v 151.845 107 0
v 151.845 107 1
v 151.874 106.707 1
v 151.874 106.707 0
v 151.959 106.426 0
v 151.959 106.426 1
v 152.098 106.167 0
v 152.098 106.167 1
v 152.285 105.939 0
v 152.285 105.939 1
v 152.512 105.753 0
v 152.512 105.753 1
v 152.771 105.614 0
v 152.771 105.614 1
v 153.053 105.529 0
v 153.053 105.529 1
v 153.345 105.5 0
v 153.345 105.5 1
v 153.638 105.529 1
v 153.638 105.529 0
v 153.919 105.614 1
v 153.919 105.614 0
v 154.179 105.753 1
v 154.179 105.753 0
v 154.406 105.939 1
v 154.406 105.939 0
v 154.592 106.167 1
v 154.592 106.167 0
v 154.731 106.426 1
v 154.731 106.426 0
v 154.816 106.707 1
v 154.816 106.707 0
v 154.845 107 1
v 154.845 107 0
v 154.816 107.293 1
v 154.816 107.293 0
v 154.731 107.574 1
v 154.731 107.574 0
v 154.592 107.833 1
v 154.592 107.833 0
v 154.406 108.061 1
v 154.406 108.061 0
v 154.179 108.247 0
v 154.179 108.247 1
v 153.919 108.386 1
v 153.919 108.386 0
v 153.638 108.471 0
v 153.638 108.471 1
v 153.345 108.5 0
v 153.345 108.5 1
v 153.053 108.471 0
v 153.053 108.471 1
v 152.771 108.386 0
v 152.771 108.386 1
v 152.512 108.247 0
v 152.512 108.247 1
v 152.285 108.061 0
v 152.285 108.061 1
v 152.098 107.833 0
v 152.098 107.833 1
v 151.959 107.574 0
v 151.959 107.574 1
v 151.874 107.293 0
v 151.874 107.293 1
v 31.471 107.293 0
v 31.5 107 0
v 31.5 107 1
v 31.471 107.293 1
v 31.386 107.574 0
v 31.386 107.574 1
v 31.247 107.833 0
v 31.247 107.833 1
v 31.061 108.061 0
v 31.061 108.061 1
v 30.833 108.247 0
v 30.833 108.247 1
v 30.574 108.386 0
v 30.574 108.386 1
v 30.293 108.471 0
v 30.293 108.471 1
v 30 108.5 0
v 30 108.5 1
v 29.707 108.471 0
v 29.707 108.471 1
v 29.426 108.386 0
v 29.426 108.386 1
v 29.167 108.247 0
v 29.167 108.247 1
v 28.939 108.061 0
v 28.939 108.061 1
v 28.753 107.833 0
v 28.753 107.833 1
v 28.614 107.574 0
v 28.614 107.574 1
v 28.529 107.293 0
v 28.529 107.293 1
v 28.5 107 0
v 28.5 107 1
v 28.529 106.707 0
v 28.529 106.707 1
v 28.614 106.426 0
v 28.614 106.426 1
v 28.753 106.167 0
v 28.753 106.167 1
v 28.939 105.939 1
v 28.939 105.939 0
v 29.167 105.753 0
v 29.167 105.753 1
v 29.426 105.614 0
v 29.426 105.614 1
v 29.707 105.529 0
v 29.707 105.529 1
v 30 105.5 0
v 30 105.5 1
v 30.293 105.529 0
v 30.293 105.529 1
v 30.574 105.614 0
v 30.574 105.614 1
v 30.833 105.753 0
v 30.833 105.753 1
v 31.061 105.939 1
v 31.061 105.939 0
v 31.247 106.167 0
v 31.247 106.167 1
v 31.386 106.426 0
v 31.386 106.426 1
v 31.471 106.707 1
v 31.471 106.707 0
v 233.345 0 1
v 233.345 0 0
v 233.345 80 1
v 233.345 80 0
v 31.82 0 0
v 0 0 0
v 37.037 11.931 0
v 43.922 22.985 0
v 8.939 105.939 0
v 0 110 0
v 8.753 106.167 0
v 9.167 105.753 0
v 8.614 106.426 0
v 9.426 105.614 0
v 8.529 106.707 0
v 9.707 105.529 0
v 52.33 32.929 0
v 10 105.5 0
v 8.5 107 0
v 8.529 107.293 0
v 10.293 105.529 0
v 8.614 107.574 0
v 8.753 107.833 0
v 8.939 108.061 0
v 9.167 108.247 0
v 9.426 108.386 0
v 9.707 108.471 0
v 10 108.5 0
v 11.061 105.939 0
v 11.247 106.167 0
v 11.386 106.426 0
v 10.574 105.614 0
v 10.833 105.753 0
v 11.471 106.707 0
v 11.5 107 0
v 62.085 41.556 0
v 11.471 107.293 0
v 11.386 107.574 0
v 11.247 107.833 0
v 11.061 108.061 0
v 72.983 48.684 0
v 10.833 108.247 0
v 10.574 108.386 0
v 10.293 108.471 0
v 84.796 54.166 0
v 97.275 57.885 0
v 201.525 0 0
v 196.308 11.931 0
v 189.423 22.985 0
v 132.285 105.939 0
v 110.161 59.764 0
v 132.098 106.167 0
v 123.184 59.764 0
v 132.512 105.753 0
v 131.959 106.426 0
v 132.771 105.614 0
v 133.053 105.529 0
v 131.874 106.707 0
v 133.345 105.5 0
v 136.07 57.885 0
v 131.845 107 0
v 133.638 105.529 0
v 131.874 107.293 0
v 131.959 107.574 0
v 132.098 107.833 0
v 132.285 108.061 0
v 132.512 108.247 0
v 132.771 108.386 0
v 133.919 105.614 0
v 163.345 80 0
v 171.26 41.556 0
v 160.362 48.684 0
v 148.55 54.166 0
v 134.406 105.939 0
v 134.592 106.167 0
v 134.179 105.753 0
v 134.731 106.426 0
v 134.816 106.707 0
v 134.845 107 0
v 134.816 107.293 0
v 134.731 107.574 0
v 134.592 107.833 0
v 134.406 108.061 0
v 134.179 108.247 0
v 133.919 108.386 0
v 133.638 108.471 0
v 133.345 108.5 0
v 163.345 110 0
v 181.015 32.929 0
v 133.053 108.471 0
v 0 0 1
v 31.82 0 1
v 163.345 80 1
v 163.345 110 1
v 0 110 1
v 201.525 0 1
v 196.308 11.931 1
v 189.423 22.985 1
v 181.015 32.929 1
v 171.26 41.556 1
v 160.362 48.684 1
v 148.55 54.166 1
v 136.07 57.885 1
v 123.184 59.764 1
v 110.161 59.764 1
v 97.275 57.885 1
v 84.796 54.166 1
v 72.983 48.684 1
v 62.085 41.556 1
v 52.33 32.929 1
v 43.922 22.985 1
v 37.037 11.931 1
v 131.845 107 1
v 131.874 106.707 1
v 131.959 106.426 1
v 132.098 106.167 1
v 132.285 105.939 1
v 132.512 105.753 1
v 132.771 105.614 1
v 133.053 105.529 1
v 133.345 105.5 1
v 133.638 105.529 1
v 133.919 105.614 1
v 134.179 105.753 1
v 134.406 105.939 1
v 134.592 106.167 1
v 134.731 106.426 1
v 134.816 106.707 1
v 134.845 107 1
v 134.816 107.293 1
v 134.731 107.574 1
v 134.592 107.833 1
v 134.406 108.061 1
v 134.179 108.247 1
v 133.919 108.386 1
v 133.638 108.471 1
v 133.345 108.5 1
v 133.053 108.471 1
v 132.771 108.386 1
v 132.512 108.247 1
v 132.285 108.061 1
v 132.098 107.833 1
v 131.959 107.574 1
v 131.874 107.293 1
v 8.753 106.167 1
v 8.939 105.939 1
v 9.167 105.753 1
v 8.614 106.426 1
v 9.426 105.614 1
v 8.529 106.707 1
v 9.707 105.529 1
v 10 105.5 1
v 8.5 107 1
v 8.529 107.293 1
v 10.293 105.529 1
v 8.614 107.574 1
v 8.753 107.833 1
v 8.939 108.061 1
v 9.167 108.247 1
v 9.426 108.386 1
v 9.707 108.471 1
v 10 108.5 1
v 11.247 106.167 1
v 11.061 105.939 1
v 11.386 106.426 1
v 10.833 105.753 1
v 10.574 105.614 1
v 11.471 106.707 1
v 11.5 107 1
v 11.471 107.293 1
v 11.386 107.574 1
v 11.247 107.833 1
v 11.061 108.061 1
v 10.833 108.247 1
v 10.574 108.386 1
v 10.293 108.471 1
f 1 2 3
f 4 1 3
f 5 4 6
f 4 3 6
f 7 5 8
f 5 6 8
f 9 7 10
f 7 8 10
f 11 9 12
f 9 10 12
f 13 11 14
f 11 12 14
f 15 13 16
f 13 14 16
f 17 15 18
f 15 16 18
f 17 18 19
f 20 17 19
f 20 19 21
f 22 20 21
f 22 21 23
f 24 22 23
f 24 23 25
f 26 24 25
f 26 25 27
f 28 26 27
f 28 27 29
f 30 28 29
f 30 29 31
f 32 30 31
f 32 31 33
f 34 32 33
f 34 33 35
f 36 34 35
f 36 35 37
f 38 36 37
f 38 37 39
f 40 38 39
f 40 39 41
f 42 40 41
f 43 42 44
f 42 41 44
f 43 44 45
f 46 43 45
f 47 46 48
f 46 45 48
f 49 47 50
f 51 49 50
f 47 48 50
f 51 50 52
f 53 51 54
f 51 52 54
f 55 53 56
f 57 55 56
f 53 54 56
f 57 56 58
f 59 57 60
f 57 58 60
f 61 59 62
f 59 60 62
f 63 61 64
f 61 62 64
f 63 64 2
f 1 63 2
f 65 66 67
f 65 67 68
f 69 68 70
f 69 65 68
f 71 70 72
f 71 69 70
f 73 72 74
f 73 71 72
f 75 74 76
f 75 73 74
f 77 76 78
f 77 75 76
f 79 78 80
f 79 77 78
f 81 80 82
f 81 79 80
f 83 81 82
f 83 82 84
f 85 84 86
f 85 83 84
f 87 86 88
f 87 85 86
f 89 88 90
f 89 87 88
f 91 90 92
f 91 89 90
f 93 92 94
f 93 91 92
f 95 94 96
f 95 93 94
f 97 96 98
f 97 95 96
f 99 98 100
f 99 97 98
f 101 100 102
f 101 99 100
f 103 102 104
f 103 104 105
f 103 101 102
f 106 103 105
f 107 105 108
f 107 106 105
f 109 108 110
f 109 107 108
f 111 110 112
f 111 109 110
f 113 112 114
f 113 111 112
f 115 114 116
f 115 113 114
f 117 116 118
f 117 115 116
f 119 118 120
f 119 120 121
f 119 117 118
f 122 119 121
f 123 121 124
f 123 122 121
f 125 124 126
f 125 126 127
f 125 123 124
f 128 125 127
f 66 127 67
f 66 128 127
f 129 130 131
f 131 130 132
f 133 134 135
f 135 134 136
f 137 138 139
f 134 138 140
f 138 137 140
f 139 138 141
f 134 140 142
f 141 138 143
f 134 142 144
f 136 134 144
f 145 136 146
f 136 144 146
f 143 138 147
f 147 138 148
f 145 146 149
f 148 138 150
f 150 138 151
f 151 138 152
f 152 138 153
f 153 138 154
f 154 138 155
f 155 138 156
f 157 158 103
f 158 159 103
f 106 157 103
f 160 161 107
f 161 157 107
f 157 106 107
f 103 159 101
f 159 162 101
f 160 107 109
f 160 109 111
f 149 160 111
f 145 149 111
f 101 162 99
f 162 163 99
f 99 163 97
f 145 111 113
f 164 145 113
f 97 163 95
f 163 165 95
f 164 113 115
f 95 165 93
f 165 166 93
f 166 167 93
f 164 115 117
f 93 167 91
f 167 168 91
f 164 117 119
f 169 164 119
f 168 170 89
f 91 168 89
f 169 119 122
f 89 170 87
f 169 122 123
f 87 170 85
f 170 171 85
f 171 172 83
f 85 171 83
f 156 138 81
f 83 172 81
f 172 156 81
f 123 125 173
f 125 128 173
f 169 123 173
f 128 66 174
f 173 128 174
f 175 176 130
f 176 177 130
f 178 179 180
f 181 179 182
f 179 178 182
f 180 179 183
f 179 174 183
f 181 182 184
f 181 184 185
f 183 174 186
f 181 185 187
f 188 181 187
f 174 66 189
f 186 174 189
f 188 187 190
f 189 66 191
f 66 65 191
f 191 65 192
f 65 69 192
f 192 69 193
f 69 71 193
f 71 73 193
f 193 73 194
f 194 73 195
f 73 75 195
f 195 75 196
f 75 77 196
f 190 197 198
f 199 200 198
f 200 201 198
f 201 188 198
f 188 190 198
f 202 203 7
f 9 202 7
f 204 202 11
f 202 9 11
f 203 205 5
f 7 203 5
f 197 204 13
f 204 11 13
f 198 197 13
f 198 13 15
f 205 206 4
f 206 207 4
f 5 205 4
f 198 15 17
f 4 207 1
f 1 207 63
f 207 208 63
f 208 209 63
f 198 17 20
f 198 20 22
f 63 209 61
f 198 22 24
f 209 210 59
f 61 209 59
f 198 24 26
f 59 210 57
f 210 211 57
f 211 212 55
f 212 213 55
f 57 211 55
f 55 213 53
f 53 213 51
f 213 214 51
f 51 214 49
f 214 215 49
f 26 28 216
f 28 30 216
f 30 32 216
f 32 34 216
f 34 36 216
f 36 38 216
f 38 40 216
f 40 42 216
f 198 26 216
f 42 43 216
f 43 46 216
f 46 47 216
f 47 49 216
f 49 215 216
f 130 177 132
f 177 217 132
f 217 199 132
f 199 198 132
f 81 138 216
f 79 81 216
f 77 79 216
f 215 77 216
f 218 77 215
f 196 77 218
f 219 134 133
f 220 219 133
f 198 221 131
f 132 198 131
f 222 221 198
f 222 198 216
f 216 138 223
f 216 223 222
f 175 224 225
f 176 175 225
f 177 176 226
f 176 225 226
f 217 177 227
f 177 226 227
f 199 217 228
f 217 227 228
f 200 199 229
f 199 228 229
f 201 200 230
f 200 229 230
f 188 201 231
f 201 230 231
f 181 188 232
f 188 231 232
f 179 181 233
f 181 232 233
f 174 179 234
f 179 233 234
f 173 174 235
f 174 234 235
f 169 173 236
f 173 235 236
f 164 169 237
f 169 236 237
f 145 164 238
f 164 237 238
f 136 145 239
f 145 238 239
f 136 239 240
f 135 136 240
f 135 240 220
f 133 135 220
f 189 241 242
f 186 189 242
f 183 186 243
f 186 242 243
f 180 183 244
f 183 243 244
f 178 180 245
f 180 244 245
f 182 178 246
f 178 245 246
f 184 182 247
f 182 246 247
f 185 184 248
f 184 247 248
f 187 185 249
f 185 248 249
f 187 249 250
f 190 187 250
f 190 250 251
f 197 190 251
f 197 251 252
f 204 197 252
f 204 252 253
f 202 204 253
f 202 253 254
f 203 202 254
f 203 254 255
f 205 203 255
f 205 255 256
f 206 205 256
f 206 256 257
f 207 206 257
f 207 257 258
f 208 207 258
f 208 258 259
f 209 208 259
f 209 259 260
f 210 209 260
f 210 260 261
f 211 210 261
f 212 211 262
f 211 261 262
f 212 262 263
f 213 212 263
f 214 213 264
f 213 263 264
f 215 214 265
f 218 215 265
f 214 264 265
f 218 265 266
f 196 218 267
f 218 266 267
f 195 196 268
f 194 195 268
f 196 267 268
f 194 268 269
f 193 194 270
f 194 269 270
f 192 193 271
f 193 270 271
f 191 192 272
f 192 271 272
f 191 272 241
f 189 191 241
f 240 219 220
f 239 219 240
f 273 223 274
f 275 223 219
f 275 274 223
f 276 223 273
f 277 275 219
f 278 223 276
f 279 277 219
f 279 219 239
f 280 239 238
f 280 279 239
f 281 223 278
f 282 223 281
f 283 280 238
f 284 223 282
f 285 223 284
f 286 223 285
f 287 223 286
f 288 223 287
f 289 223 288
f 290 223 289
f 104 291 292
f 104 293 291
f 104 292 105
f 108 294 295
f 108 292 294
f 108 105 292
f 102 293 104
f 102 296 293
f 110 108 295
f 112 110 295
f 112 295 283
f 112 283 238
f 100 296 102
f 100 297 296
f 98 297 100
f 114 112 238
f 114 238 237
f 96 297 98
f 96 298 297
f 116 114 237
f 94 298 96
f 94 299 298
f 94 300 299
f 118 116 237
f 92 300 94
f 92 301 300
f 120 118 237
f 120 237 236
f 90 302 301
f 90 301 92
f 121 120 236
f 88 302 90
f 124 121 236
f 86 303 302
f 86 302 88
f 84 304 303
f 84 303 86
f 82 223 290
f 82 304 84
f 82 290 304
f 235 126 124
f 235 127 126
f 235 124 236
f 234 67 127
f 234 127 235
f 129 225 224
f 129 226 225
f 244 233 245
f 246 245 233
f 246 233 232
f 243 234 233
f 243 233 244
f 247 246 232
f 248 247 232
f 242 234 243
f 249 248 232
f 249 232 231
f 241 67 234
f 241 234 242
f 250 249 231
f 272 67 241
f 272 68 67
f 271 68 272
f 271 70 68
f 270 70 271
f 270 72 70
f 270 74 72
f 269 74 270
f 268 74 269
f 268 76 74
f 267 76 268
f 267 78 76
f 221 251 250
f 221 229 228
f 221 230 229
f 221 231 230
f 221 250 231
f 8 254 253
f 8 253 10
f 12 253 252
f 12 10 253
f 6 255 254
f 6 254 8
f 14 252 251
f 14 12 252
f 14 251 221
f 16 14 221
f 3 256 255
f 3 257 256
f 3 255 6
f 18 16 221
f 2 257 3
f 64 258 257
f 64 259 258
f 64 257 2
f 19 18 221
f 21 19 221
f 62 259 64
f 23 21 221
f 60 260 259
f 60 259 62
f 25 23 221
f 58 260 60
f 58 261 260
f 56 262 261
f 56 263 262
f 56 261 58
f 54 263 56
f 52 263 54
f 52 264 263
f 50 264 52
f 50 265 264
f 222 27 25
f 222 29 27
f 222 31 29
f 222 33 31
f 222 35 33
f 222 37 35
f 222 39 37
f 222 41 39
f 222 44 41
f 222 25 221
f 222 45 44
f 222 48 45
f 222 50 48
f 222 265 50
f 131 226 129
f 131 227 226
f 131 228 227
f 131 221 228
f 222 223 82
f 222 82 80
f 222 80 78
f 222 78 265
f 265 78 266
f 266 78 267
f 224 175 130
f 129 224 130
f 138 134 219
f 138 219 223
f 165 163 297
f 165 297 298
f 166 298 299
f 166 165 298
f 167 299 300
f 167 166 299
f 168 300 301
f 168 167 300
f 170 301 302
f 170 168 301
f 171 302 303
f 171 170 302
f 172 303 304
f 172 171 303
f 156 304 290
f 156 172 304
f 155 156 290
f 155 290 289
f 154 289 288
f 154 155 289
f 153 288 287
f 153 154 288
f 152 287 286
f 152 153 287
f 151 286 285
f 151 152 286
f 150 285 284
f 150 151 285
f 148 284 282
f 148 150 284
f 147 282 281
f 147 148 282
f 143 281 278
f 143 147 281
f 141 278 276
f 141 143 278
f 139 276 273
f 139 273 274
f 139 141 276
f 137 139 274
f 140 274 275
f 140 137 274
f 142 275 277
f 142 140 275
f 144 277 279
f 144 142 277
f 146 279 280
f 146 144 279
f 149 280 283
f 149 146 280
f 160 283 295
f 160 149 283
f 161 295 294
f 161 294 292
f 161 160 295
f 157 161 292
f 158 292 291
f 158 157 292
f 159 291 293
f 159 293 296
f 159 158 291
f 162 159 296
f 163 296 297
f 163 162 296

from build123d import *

# Parameters (mm, degrees)
SKETCH_1_W          = 233.345237792
SKETCH_1_H          = 110
SKETCH_1_R          = 1.5
EXTRUDE_1_DEPTH     = 1
SKETCH_2_W          = 70
SKETCH_2_H          = 30
CUT_EXTRUDE_1_DEPTH = 258.974804971
SKETCH_3_R          = 1.5
CUT_EXTRUDE_2_DEPTH = 258.974804971
SKETCH_4_R          = 90
CUT_EXTRUDE_3_DEPTH = 258.974804971


with BuildPart() as part:
    # 草图1 → 凸台-拉伸1 (new body)
    with BuildSketch(Plane.XY):
        with Locations((116.672618896, 55)):
            Rectangle(SKETCH_1_W, SKETCH_1_H)
        with Locations((10, 107)):
            Circle(SKETCH_1_R, mode=Mode.SUBTRACT)
        with Locations((30, 107)):
            Circle(SKETCH_1_R, mode=Mode.SUBTRACT)
        with Locations(Location((203.345237792, 107, 0), (0, 0, 180))):
            Circle(SKETCH_1_R, mode=Mode.SUBTRACT)
        with Locations(Location((223.345237792, 107, 0), (0, 0, 180))):
            Circle(SKETCH_1_R, mode=Mode.SUBTRACT)
    extrude(amount=EXTRUDE_1_DEPTH)

    # 草图2 → 切除-拉伸1 (cut, through all)
    with BuildSketch(Plane.XY.offset(1)):
        with Locations((198.345237792, 95)):
            Rectangle(SKETCH_2_W, SKETCH_2_H)
    extrude(amount=-CUT_EXTRUDE_1_DEPTH, mode=Mode.SUBTRACT)

    # 草图3 → 切除-拉伸2 (cut, through all)
    with BuildSketch(Plane.XY.offset(1)):
        with Locations((10, 107)):
            Circle(SKETCH_3_R)
        with Locations((30, 107)):
            Circle(SKETCH_3_R)
        with Locations(Location((133.345237792, 107, 0), (0, 0, 180))):
            Circle(SKETCH_3_R)
        with Locations(Location((153.345237792, 107, 0), (0, 0, 180))):
            Circle(SKETCH_3_R)
    extrude(amount=-CUT_EXTRUDE_2_DEPTH, mode=Mode.SUBTRACT)

    # 草图4 → 切除-拉伸3 (cut, through all)
    with BuildSketch(Plane.XY.offset(1)):
        with Locations((116.672618896, -30)):
            Circle(SKETCH_4_R)
    extrude(amount=-CUT_EXTRUDE_3_DEPTH, mode=Mode.SUBTRACT)


solid = part.part
